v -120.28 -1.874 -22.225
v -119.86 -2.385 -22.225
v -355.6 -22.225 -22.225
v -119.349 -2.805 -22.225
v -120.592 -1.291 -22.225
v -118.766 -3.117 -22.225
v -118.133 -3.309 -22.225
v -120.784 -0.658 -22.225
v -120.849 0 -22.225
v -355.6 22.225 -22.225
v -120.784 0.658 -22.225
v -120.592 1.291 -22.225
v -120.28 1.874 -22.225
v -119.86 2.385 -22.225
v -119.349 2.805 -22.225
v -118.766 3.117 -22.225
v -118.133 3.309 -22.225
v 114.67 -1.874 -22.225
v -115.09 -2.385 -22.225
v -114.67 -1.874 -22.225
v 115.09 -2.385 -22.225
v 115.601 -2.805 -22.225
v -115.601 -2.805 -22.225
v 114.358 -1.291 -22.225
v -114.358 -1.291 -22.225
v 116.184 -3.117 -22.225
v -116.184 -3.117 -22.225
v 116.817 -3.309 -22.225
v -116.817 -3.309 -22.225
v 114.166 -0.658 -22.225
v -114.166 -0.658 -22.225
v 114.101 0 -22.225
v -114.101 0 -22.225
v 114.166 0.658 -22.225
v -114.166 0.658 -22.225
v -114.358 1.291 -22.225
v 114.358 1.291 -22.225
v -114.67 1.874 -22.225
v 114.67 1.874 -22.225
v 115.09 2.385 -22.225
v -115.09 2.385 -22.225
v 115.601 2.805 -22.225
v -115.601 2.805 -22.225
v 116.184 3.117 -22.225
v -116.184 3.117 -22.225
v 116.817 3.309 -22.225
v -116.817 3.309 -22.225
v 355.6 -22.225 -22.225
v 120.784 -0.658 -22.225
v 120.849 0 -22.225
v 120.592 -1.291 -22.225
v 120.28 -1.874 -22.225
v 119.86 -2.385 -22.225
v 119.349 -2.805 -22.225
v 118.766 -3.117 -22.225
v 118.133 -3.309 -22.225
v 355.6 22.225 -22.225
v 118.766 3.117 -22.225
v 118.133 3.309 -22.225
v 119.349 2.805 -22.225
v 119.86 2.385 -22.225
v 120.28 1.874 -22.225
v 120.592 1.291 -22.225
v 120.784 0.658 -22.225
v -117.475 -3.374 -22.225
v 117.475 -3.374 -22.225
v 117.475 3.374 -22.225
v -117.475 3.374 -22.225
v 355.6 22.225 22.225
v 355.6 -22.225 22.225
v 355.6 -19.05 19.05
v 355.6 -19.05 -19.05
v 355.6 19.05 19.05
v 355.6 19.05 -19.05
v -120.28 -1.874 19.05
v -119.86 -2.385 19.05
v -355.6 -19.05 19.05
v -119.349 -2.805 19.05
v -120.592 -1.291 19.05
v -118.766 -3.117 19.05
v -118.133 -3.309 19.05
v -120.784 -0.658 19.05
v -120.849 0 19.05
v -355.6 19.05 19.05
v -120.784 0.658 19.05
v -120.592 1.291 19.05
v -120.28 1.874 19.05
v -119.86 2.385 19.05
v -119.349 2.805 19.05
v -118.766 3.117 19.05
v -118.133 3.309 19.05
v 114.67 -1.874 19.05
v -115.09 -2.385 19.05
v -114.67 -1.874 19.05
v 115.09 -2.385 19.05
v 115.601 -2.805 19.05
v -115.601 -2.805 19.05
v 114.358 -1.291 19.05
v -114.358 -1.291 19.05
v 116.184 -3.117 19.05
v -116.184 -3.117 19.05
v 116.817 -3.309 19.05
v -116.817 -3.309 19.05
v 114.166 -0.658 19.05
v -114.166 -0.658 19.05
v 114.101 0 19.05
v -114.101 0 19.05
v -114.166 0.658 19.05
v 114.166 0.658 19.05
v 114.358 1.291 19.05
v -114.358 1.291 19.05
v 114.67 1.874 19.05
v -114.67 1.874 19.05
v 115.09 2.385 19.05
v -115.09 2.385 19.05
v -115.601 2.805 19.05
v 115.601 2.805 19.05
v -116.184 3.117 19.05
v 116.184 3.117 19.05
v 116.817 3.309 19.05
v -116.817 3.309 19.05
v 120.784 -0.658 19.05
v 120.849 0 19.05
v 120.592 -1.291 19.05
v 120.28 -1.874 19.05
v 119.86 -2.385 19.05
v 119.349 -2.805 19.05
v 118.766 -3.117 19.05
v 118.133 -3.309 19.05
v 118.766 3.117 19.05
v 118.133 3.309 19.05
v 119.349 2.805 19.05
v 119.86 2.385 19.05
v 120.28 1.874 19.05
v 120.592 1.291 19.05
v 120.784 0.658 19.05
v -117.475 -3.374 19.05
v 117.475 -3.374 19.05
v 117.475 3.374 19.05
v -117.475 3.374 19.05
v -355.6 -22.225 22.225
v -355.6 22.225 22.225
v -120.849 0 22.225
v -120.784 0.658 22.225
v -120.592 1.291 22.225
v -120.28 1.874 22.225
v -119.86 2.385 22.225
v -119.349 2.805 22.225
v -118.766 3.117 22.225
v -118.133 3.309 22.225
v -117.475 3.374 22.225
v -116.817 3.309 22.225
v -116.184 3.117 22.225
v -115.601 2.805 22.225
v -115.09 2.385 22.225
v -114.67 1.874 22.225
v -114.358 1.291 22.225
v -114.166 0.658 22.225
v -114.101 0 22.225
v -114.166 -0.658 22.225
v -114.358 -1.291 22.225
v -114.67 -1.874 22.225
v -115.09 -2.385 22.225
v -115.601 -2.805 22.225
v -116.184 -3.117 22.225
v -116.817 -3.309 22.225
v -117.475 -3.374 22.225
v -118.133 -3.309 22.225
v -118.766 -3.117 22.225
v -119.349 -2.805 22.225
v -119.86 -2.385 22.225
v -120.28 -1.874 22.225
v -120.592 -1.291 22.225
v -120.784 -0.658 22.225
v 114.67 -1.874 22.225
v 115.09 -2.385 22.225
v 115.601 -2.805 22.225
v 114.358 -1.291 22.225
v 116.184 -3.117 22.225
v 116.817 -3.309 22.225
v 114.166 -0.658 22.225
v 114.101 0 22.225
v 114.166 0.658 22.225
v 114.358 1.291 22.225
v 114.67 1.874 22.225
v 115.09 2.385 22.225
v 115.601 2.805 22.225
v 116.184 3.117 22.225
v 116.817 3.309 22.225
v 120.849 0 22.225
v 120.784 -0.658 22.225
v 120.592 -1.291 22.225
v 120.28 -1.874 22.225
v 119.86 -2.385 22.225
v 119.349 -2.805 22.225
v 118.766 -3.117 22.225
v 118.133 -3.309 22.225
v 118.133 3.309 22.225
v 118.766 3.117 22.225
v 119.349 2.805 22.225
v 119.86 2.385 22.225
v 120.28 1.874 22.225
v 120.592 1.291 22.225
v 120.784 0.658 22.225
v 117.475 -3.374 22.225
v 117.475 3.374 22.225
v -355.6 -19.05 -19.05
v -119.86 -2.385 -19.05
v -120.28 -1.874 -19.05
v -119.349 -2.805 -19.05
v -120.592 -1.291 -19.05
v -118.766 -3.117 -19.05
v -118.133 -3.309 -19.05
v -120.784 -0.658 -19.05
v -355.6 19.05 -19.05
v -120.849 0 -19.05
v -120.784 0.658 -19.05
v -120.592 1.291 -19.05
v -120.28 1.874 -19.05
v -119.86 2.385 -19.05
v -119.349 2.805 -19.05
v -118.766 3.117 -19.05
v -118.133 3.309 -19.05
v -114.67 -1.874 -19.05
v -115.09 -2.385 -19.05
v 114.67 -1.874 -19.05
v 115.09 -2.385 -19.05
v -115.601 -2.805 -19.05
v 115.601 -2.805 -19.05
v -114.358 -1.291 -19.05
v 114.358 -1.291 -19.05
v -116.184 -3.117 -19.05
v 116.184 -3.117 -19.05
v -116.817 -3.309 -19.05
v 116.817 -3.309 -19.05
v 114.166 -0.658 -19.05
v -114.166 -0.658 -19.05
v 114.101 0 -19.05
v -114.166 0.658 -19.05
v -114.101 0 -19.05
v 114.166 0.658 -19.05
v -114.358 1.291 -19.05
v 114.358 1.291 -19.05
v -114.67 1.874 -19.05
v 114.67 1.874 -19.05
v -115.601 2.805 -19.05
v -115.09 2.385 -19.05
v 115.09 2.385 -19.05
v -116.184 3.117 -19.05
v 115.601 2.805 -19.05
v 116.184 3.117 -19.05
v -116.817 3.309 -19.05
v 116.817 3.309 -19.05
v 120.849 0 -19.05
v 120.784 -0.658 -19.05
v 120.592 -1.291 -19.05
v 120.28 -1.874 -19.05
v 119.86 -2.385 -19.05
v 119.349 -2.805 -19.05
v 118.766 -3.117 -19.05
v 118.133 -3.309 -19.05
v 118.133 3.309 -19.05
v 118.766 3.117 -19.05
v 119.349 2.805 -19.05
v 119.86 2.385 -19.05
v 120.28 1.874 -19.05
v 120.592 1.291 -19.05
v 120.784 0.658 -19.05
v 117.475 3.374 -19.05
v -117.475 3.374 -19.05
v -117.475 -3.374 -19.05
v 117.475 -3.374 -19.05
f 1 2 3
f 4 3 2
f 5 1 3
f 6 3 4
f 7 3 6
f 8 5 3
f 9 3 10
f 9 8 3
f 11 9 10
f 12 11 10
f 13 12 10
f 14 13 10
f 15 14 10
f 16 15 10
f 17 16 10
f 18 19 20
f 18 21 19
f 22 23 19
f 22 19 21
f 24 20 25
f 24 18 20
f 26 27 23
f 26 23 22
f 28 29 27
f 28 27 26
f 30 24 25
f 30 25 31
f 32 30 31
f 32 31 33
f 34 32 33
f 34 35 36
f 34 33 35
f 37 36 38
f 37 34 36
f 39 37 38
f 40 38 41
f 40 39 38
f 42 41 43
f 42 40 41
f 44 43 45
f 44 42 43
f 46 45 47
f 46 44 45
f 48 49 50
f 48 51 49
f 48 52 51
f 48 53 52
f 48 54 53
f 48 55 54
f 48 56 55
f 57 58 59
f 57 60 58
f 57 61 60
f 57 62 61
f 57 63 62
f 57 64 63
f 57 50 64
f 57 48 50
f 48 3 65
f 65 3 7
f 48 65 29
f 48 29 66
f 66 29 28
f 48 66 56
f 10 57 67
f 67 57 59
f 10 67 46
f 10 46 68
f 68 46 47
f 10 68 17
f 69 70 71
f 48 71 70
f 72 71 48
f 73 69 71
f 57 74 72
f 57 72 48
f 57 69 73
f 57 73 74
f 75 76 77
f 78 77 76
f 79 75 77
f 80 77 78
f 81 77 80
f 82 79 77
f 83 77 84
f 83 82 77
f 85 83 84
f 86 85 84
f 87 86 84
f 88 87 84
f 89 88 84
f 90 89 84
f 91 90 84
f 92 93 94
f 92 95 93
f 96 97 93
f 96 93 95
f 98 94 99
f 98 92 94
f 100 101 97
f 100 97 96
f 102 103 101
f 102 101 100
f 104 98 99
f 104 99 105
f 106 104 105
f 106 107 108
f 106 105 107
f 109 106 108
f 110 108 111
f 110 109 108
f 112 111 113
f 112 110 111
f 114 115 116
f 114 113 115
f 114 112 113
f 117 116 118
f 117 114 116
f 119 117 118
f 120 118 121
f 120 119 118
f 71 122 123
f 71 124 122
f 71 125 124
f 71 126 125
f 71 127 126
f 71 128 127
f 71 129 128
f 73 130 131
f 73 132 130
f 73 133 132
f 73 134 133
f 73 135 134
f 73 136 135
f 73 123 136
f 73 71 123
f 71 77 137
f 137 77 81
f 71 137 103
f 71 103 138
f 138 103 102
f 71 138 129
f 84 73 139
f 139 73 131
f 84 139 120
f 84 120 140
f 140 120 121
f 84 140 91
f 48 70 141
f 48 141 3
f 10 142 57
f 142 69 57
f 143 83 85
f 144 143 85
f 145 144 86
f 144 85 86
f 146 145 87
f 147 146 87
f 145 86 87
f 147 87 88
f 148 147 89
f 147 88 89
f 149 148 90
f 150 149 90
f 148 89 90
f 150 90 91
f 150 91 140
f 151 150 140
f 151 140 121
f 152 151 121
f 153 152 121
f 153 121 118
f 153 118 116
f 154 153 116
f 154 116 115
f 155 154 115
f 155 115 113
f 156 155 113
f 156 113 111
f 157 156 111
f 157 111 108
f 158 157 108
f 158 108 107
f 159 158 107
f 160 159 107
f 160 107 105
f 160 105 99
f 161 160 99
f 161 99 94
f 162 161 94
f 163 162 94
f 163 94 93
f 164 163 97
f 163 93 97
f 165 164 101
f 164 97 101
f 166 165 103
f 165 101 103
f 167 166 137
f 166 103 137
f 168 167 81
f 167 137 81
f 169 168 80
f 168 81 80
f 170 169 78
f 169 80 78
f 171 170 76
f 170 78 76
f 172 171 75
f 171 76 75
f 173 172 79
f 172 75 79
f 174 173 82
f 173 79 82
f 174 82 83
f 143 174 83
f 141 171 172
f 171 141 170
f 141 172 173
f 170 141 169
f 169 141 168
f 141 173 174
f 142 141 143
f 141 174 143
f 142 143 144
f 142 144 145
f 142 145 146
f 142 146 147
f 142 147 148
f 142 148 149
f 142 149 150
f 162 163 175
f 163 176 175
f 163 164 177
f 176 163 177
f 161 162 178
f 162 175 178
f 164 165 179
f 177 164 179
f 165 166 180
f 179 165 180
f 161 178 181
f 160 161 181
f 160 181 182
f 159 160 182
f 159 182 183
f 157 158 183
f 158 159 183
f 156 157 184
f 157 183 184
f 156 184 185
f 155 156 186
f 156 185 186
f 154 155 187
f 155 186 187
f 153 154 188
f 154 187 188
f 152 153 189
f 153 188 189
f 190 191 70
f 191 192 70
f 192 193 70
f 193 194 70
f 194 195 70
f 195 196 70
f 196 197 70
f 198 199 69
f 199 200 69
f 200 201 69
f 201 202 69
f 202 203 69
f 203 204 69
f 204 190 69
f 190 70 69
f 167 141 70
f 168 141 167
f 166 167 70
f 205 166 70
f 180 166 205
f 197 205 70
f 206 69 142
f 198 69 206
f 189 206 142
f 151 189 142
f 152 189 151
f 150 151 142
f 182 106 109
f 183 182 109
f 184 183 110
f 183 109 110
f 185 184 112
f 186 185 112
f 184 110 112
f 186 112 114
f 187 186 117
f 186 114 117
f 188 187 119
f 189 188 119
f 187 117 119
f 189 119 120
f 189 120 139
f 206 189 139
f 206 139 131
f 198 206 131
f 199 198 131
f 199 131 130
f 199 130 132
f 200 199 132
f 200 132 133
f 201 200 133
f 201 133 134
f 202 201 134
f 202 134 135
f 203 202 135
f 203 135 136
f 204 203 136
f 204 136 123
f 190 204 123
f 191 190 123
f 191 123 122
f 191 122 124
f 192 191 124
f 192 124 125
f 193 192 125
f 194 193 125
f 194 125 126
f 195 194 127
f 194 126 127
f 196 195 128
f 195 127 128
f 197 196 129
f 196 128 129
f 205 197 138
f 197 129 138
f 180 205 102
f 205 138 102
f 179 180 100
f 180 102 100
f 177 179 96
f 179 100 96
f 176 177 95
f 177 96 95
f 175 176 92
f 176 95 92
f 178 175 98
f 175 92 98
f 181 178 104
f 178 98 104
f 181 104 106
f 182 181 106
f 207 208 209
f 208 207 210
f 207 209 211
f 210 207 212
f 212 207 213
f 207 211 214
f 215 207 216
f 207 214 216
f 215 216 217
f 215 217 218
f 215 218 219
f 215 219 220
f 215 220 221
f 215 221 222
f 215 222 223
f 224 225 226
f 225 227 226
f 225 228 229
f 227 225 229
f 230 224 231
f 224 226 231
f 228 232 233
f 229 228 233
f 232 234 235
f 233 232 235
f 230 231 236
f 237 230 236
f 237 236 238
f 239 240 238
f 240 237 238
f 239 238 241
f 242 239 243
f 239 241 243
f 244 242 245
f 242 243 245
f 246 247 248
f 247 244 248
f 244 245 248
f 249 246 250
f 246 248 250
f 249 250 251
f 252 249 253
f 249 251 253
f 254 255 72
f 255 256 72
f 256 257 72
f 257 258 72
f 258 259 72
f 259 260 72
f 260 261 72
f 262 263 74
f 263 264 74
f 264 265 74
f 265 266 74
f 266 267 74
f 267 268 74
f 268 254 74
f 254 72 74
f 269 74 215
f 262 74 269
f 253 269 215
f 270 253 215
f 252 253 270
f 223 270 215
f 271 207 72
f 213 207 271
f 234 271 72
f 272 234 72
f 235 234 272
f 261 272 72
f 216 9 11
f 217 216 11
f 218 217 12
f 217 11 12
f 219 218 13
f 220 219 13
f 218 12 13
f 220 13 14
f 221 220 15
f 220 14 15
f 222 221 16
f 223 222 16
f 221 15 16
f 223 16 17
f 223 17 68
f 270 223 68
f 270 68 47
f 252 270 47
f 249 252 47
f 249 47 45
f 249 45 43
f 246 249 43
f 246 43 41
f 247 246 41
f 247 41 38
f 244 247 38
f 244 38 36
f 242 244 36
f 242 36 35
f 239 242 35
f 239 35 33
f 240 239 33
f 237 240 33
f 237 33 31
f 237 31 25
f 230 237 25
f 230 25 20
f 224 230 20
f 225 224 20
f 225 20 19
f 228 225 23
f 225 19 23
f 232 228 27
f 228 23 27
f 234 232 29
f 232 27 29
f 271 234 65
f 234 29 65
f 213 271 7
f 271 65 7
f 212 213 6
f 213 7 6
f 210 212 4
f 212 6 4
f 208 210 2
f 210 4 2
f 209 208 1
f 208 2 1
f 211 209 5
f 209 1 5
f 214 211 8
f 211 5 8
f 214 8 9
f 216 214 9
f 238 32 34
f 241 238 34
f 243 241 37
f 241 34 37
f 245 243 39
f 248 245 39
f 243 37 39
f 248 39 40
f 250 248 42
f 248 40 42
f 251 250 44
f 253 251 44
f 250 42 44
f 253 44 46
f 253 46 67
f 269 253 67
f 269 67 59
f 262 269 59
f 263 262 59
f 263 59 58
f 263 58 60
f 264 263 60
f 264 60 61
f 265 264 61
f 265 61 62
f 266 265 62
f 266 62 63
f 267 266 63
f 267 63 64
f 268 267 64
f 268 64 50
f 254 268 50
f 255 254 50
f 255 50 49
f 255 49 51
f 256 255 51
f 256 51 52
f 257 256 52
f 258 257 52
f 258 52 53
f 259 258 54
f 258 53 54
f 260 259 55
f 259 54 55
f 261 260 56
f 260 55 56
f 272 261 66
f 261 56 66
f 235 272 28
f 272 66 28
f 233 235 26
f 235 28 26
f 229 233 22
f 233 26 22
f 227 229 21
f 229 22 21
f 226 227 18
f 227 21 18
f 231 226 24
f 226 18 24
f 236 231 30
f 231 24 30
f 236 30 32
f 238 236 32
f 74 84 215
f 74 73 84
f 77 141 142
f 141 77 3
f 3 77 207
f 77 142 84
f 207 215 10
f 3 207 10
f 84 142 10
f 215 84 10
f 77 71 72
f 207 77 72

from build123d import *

# Parameters (mm, degrees)
SKETCH1_W                        = 44.45
SKETCH1_H                        = 44.45
SKETCH1_W_2                      = 38.1
SKETCH1_H_2                      = 38.1
BOSS_EXTRUDE1_DEPTH              = 355.6
BOSS_EXTRUDE1_DEPTH_BACK         = 355.6
F_17_64_0_26563_DIAMETER_HOLE1_D = 6.747002


with BuildPart() as part:
    # Sketch1 → Boss-Extrude1 (new body, two sides)
    with BuildSketch(Plane(origin=(0, 0, 0), x_dir=(0, 0, -1), z_dir=(1, 0, 0))) as boss_extrude1_sk:
        Rectangle(SKETCH1_W, SKETCH1_H)
        Rectangle(SKETCH1_W_2, SKETCH1_H_2, mode=Mode.SUBTRACT)
    extrude(amount=BOSS_EXTRUDE1_DEPTH)
    extrude(boss_extrude1_sk.sketch, amount=-BOSS_EXTRUDE1_DEPTH_BACK)

    # 17/64 (0.26563) Diameter Hole1 (through all)
    with Locations(Plane.XY.offset(22.225)):
        with Locations((-117.475, 0), (117.475, 0)):
            Hole(F_17_64_0_26563_DIAMETER_HOLE1_D / 2)


solid = part.part
